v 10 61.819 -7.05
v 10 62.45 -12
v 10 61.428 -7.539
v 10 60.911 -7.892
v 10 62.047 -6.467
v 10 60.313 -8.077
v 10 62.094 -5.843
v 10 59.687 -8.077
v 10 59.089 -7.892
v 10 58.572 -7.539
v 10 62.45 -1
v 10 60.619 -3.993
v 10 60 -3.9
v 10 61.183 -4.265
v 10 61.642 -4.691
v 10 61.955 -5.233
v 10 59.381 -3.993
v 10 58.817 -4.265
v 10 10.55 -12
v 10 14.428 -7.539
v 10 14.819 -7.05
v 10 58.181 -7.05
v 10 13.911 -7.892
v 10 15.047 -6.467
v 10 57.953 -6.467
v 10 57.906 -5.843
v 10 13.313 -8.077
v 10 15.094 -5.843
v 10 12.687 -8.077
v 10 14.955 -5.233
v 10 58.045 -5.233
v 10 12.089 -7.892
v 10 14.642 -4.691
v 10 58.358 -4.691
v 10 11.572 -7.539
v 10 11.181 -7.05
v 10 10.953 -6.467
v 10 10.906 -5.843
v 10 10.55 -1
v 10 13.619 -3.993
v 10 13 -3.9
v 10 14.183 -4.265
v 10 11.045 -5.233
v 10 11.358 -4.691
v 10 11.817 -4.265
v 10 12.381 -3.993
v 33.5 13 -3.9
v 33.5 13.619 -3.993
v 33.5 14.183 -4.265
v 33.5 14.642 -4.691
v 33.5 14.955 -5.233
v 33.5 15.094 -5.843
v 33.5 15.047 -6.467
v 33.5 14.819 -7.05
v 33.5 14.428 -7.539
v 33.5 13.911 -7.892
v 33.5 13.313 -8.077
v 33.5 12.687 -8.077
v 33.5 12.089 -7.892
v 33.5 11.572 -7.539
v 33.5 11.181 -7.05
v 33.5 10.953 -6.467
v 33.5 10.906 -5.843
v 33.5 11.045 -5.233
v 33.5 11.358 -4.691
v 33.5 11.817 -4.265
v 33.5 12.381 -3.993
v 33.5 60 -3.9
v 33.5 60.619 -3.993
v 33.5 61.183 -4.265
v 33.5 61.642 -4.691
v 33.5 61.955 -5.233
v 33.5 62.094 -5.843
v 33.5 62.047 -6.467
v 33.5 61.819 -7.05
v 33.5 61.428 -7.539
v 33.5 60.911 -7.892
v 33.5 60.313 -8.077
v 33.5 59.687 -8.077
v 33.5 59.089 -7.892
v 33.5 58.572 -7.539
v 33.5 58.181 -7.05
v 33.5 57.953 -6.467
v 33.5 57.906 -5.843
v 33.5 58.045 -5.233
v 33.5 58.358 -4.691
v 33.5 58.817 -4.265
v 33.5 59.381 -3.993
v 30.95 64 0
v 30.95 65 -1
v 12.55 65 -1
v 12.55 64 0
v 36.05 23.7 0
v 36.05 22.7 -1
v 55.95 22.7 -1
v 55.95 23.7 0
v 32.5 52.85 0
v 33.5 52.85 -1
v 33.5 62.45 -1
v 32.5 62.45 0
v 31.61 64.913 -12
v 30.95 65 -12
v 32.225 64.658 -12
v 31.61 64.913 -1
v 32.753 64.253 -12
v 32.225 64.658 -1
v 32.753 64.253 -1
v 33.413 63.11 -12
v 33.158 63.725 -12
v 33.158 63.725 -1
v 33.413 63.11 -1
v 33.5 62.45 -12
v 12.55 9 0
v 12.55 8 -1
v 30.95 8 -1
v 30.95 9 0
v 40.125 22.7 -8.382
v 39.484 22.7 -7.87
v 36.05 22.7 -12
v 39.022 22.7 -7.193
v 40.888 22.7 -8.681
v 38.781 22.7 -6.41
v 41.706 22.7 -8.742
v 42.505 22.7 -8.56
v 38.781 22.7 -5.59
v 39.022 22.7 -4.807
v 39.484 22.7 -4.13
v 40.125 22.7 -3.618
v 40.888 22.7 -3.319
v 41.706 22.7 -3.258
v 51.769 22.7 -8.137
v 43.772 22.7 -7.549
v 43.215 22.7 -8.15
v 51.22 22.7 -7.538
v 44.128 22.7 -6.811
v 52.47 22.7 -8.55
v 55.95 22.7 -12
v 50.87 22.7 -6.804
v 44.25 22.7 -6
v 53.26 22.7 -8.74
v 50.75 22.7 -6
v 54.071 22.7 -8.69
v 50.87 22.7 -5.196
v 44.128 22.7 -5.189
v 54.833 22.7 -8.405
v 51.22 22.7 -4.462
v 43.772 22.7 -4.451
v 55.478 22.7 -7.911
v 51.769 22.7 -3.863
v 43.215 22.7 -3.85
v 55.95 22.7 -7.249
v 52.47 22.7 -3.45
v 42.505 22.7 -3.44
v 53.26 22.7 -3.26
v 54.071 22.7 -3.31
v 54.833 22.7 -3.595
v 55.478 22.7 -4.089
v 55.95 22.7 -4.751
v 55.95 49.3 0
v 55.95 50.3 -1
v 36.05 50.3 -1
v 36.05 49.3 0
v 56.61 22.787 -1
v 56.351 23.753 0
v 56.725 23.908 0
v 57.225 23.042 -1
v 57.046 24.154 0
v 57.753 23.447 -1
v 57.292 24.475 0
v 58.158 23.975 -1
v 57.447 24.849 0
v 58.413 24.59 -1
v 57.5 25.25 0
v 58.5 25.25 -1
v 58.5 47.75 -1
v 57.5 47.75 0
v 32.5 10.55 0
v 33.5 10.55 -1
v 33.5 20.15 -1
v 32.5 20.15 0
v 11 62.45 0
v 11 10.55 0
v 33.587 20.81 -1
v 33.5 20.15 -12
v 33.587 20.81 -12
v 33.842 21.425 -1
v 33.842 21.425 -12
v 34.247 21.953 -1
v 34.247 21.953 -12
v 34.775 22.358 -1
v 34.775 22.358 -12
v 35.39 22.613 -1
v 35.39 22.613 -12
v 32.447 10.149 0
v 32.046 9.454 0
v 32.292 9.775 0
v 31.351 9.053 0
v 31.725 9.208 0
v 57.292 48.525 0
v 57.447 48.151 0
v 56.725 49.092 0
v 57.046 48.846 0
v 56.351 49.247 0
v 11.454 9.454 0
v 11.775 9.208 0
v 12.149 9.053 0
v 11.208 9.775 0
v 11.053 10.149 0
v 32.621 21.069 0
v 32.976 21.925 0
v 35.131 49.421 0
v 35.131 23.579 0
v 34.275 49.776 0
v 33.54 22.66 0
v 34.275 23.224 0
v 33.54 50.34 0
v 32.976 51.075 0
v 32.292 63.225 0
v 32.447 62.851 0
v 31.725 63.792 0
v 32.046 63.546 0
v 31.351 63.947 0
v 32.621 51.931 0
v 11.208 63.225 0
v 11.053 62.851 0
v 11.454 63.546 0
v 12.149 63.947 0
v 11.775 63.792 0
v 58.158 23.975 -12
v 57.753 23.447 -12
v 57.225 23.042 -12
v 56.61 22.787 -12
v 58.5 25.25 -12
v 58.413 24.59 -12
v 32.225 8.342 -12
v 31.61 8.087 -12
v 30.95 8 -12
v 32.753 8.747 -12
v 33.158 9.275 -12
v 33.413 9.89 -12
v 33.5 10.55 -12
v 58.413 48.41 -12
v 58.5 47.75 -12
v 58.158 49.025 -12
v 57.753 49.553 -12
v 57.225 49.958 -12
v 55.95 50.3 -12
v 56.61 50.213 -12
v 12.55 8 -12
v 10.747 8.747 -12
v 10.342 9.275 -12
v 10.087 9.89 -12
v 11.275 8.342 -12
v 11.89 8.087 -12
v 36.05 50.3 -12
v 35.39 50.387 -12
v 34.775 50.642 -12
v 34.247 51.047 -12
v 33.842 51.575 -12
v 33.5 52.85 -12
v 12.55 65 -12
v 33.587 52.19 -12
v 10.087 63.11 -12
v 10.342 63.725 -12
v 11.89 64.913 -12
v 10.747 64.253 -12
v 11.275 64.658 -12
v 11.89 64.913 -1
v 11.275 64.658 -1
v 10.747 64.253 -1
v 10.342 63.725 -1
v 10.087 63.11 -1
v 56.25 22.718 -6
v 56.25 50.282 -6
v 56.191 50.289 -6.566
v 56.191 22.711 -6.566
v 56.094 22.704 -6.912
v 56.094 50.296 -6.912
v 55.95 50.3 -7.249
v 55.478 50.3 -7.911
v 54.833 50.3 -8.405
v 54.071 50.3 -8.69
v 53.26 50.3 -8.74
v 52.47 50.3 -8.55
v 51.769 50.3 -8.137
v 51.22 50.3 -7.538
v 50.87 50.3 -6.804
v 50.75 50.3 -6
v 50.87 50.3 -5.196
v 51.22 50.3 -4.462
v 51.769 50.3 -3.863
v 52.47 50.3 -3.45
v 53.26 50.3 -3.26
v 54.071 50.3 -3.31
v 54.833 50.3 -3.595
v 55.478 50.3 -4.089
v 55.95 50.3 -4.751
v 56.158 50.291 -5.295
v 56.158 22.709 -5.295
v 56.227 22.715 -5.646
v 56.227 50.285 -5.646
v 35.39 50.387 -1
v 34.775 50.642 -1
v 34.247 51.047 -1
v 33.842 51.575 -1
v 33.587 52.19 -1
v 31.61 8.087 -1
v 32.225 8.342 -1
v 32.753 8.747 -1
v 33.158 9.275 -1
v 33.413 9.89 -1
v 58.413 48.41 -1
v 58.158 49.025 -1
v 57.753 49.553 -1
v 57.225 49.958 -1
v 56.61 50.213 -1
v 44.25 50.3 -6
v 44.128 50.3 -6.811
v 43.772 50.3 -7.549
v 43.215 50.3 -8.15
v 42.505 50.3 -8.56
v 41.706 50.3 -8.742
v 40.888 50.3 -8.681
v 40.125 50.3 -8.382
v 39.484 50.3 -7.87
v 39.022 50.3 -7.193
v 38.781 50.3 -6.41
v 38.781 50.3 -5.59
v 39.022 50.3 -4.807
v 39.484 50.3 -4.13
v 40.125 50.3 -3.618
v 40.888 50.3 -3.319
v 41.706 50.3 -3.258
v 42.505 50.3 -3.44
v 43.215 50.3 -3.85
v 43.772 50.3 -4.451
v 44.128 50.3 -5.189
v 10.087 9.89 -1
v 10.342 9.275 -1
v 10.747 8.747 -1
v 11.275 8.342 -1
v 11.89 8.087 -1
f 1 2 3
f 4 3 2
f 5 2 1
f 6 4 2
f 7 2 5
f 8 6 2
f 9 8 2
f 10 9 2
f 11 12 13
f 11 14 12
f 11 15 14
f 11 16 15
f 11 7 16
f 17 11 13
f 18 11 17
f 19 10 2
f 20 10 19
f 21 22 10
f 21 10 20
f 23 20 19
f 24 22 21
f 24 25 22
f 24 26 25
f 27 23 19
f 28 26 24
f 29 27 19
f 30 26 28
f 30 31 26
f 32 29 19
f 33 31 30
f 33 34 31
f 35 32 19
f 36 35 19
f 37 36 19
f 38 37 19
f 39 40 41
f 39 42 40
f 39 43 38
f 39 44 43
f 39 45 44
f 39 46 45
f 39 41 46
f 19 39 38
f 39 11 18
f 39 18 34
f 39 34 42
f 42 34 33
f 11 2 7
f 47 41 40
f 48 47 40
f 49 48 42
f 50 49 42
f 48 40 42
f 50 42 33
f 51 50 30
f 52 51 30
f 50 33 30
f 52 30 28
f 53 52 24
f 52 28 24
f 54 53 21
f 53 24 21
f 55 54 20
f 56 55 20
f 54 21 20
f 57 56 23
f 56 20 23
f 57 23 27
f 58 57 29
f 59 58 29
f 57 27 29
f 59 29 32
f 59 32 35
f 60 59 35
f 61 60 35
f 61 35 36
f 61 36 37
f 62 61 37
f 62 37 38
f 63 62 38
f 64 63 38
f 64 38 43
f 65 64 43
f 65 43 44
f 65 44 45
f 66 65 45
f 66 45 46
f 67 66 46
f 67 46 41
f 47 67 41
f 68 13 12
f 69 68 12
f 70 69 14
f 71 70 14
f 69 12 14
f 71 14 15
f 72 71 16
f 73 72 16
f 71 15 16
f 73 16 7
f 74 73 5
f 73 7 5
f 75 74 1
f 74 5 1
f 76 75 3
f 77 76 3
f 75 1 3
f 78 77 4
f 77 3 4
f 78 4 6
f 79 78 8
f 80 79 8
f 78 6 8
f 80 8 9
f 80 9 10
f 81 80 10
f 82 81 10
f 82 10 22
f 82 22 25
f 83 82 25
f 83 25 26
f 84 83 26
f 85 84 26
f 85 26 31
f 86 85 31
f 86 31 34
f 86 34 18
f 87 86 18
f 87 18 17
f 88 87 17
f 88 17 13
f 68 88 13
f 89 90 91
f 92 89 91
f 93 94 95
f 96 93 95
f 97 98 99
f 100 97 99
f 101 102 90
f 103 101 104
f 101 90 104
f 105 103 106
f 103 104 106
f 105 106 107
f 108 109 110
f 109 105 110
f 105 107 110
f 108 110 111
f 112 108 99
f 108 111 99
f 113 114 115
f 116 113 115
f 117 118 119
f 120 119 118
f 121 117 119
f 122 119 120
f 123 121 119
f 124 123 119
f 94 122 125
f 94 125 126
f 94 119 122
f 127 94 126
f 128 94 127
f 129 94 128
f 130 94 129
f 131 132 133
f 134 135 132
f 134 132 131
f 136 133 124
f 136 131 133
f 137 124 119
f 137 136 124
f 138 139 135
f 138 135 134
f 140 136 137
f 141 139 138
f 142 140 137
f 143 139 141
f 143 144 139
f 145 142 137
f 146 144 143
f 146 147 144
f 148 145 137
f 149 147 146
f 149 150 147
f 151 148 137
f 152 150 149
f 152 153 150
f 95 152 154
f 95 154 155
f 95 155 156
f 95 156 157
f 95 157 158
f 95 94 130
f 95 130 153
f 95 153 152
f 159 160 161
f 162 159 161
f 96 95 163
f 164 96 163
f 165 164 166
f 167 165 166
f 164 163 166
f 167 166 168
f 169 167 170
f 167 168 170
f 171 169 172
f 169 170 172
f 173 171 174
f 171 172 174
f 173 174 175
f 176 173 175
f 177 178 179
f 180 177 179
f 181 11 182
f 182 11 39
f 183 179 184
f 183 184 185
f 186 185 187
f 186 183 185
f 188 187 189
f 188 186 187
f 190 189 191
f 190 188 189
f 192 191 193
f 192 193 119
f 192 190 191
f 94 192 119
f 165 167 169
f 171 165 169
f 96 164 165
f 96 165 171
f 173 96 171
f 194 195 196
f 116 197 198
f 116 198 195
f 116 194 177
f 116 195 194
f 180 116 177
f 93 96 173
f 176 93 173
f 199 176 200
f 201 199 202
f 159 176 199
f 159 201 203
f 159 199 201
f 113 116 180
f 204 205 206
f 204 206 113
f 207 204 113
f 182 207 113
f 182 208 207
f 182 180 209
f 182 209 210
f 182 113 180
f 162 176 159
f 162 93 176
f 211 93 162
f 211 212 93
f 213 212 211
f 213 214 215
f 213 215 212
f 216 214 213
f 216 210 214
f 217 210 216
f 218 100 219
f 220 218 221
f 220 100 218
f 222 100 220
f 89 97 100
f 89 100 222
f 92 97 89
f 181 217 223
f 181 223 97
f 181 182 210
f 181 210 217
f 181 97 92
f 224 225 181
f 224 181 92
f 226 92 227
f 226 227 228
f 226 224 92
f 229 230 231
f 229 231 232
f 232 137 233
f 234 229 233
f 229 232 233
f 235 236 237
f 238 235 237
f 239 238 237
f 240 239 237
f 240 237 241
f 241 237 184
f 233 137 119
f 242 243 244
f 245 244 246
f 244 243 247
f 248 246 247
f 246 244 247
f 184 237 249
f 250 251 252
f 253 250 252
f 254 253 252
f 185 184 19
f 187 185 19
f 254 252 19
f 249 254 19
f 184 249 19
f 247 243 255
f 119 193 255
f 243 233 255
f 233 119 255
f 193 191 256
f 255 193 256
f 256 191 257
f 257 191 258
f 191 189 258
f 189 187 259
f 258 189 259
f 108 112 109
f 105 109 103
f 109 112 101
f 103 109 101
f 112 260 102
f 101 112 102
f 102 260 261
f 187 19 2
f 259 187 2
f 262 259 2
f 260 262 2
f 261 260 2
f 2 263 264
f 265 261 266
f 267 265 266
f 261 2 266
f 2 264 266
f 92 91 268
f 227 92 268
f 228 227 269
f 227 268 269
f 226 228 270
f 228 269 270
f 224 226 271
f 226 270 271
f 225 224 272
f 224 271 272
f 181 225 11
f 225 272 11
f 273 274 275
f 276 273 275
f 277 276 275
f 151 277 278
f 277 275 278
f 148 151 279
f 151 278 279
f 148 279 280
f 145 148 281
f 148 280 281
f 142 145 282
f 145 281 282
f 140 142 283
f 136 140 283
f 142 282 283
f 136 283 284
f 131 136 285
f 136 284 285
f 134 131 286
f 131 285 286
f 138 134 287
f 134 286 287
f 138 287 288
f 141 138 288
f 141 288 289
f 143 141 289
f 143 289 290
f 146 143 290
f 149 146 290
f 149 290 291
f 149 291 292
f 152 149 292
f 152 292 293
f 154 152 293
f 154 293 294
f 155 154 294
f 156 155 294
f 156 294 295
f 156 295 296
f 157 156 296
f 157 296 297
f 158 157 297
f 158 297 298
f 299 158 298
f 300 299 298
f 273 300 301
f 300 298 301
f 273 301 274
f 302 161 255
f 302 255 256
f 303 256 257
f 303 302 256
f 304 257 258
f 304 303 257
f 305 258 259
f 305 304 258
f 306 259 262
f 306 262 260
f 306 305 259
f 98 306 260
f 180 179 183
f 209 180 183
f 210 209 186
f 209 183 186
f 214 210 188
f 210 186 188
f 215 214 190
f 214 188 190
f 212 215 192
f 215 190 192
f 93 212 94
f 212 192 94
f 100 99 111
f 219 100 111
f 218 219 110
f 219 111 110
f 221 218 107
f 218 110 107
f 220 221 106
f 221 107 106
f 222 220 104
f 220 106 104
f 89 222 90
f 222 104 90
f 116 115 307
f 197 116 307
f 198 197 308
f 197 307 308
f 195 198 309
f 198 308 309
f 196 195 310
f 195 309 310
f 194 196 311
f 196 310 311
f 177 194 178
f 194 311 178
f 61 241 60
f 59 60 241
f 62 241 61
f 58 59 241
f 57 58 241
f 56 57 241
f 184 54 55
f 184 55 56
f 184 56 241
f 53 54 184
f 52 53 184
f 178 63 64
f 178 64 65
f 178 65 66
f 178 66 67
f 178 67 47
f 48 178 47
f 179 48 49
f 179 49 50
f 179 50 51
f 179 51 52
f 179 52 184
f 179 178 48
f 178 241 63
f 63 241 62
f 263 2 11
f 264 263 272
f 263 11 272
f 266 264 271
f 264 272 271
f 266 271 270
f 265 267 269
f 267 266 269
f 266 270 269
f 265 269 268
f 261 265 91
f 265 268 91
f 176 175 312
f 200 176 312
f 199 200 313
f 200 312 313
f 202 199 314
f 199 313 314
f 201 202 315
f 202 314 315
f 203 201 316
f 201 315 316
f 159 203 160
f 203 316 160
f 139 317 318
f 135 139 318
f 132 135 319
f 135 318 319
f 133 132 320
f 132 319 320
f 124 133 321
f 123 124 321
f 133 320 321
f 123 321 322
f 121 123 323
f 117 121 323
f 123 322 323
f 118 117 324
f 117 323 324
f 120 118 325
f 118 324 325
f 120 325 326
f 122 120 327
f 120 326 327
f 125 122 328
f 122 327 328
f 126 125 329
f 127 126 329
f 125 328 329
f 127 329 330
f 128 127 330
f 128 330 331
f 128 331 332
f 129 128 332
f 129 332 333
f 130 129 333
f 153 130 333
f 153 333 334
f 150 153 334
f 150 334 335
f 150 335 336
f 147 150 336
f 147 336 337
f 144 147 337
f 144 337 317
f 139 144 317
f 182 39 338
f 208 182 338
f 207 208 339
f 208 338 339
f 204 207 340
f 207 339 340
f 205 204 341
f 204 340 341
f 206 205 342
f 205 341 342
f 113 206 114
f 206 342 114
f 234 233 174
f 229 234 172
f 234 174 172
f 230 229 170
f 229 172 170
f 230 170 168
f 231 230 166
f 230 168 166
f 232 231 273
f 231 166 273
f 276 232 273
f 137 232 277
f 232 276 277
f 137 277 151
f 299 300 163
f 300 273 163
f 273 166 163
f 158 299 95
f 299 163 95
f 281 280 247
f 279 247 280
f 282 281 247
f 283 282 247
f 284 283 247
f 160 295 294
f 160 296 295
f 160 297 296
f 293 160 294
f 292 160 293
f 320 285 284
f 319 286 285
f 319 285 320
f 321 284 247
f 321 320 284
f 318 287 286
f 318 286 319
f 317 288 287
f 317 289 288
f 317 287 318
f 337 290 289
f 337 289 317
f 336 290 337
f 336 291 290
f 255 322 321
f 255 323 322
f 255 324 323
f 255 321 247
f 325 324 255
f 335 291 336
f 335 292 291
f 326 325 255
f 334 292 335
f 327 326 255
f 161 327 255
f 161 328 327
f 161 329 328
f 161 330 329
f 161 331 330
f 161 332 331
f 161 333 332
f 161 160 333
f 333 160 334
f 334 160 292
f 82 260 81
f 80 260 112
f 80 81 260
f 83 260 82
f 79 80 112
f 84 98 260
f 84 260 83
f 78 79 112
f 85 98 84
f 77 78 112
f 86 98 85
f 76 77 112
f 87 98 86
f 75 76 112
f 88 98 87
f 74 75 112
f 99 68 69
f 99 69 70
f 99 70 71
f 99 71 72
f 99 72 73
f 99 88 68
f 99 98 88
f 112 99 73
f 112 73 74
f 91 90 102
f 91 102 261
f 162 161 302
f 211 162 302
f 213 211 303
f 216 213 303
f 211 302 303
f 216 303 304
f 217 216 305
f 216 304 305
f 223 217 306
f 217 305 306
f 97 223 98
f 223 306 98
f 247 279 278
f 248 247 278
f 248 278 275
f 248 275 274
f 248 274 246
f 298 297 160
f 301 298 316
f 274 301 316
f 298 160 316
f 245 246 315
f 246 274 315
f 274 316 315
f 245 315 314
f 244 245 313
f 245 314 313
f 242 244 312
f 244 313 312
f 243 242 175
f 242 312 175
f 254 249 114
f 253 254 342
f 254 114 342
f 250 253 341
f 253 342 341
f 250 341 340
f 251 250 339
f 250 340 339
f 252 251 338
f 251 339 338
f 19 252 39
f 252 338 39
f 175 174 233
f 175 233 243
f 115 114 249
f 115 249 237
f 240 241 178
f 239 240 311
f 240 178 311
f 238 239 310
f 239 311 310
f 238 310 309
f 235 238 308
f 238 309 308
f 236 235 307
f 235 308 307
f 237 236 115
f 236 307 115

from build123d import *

# Parameters (mm, degrees)
BOSS_EXTRUDE1_DEPTH      = 12
SKETCH2_R                = 2.1
CUT_EXTRUDE1_DEPTH       = 82.983229992
M5_CLEARANCE_HOLE1_D     = 5.5
M5_CLEARANCE_HOLE1_DEPTH = 28.347633298
M5_CLEARANCE_HOLE1_TIP   = 1.652366702
FILLET1_R                = 2.55
CHAMFER1_SIZE            = 1


with BuildPart() as part:
    # Sketch1 → Boss-Extrude1 (new body)
    with BuildSketch(Plane.XY):
        Polygon((10, 65), (10, 8), (33.5, 8), (33.5, 22.7), (58.5, 22.7), (58.5, 50.3), (33.5, 50.3), (33.5, 65), align=None)
    extrude(amount=-BOSS_EXTRUDE1_DEPTH)

    # Sketch2 → Cut-Extrude1 (cut, through all)
    with BuildSketch(Plane.ZY.offset(-10)):
        with Locations((-6, 13)):
            Circle(SKETCH2_R)
        with Locations((-6, 60)):
            Circle(SKETCH2_R)
    extrude(amount=-CUT_EXTRUDE1_DEPTH, mode=Mode.SUBTRACT)

    # M5 Clearance Hole1
    with Locations(Plane(origin=(0, 22.7, 0), x_dir=(-1, 0, 0), z_dir=(0, -1, 0))):
        with Locations((-53.5, 6), (-41.5, 6)):
            Hole(M5_CLEARANCE_HOLE1_D / 2, depth=M5_CLEARANCE_HOLE1_DEPTH)
            with Locations((0, 0, -(M5_CLEARANCE_HOLE1_DEPTH + M5_CLEARANCE_HOLE1_TIP / 2))):  # 118° drill point
                Cone(0, M5_CLEARANCE_HOLE1_D / 2, M5_CLEARANCE_HOLE1_TIP, mode=Mode.SUBTRACT)

    # Fillet1
    # the kernel refuses this fillet: 2.55 mm, written as the material it adds along each edge
    with BuildSketch(Plane(origin=(33.5, 50.3, 0), x_dir=(0, 1, 0), z_dir=(0, 0, -1))) as fillet1_piece_1:
        with BuildLine():
            CenterArc((FILLET1_R, FILLET1_R), FILLET1_R, 180, 90)
            Line((0, FILLET1_R), (0, 0))
            Line((0, 0), (FILLET1_R, 0))
        make_face()
    extrude(amount=12)
    with BuildSketch(Plane(origin=(33.5, 22.7, 0), x_dir=(0, -1, 0), z_dir=(0, 0, -1))) as fillet1_piece_2:
        with BuildLine():
            CenterArc((FILLET1_R, -FILLET1_R), FILLET1_R, 90, 90)
            Line((0, -FILLET1_R), (0, 0))
            Line((0, 0), (FILLET1_R, 0))
        make_face()
    extrude(amount=12)
    # the kernel refuses this fillet: 2.55 mm, written as the material it takes off along each edge
    with BuildSketch(Plane(origin=(33.5, 65, 6.375), x_dir=(-1, 0, 0), z_dir=(0, 0, -1)), Plane(origin=(10, 65, 6.375), x_dir=(0, -1, 0), z_dir=(0, 0, -1))) as fillet1_2_piece_1:
        with BuildLine():
            CenterArc((FILLET1_R, -FILLET1_R), FILLET1_R, 90, 90)
            Line((0, -FILLET1_R), (0, 0))
            Line((0, 0), (FILLET1_R, 0))
        make_face()
    extrude(amount=24.75, mode=Mode.SUBTRACT)
    with BuildSketch(Plane(origin=(58.5, 50.3, 6.375), x_dir=(0, -1, 0), z_dir=(0, 0, -1)), Plane(origin=(58.5, 22.7, 6.375), x_dir=(-1, 0, 0), z_dir=(0, 0, -1)), Plane(origin=(33.5, 8, 6.375), x_dir=(-1, 0, 0), z_dir=(0, 0, -1)), Plane(origin=(10, 8, 6.375), x_dir=(0, 1, 0), z_dir=(0, 0, -1))) as fillet1_2_piece_2:
        with BuildLine():
            CenterArc((FILLET1_R, FILLET1_R), FILLET1_R, 180, 90)
            Line((0, FILLET1_R), (0, 0))
            Line((0, 0), (FILLET1_R, 0))
        make_face()
    extrude(amount=24.75, mode=Mode.SUBTRACT)

    # Chamfer1
    chamfer1_edges = [part.edges().sort_by_distance(p)[0] for p in [
        (58.5, 36.5, 0),
        (21.75, 65, 0),
        (10, 36.5, 0),
        (21.75, 8, 0),
        (33.5, 15.35, 0),
        (46, 22.7, 0),
        (46, 50.3, 0),
        (33.5, 57.65, 0),
        (57.753122292, 23.446877708, 0),
        (32.753122292, 8.746877708, 0),
        (10.746877708, 8.746877708, 0),
        (10.746877708, 64.253122292, 0),
        (32.753122292, 64.253122292, 0),
        (57.753122292, 49.553122292, 0),
        (34.246877708, 51.046877708, 0),
        (34.246877708, 21.953122292, 0),
    ]]
    chamfer(chamfer1_edges, length=CHAMFER1_SIZE)


solid = part.part
